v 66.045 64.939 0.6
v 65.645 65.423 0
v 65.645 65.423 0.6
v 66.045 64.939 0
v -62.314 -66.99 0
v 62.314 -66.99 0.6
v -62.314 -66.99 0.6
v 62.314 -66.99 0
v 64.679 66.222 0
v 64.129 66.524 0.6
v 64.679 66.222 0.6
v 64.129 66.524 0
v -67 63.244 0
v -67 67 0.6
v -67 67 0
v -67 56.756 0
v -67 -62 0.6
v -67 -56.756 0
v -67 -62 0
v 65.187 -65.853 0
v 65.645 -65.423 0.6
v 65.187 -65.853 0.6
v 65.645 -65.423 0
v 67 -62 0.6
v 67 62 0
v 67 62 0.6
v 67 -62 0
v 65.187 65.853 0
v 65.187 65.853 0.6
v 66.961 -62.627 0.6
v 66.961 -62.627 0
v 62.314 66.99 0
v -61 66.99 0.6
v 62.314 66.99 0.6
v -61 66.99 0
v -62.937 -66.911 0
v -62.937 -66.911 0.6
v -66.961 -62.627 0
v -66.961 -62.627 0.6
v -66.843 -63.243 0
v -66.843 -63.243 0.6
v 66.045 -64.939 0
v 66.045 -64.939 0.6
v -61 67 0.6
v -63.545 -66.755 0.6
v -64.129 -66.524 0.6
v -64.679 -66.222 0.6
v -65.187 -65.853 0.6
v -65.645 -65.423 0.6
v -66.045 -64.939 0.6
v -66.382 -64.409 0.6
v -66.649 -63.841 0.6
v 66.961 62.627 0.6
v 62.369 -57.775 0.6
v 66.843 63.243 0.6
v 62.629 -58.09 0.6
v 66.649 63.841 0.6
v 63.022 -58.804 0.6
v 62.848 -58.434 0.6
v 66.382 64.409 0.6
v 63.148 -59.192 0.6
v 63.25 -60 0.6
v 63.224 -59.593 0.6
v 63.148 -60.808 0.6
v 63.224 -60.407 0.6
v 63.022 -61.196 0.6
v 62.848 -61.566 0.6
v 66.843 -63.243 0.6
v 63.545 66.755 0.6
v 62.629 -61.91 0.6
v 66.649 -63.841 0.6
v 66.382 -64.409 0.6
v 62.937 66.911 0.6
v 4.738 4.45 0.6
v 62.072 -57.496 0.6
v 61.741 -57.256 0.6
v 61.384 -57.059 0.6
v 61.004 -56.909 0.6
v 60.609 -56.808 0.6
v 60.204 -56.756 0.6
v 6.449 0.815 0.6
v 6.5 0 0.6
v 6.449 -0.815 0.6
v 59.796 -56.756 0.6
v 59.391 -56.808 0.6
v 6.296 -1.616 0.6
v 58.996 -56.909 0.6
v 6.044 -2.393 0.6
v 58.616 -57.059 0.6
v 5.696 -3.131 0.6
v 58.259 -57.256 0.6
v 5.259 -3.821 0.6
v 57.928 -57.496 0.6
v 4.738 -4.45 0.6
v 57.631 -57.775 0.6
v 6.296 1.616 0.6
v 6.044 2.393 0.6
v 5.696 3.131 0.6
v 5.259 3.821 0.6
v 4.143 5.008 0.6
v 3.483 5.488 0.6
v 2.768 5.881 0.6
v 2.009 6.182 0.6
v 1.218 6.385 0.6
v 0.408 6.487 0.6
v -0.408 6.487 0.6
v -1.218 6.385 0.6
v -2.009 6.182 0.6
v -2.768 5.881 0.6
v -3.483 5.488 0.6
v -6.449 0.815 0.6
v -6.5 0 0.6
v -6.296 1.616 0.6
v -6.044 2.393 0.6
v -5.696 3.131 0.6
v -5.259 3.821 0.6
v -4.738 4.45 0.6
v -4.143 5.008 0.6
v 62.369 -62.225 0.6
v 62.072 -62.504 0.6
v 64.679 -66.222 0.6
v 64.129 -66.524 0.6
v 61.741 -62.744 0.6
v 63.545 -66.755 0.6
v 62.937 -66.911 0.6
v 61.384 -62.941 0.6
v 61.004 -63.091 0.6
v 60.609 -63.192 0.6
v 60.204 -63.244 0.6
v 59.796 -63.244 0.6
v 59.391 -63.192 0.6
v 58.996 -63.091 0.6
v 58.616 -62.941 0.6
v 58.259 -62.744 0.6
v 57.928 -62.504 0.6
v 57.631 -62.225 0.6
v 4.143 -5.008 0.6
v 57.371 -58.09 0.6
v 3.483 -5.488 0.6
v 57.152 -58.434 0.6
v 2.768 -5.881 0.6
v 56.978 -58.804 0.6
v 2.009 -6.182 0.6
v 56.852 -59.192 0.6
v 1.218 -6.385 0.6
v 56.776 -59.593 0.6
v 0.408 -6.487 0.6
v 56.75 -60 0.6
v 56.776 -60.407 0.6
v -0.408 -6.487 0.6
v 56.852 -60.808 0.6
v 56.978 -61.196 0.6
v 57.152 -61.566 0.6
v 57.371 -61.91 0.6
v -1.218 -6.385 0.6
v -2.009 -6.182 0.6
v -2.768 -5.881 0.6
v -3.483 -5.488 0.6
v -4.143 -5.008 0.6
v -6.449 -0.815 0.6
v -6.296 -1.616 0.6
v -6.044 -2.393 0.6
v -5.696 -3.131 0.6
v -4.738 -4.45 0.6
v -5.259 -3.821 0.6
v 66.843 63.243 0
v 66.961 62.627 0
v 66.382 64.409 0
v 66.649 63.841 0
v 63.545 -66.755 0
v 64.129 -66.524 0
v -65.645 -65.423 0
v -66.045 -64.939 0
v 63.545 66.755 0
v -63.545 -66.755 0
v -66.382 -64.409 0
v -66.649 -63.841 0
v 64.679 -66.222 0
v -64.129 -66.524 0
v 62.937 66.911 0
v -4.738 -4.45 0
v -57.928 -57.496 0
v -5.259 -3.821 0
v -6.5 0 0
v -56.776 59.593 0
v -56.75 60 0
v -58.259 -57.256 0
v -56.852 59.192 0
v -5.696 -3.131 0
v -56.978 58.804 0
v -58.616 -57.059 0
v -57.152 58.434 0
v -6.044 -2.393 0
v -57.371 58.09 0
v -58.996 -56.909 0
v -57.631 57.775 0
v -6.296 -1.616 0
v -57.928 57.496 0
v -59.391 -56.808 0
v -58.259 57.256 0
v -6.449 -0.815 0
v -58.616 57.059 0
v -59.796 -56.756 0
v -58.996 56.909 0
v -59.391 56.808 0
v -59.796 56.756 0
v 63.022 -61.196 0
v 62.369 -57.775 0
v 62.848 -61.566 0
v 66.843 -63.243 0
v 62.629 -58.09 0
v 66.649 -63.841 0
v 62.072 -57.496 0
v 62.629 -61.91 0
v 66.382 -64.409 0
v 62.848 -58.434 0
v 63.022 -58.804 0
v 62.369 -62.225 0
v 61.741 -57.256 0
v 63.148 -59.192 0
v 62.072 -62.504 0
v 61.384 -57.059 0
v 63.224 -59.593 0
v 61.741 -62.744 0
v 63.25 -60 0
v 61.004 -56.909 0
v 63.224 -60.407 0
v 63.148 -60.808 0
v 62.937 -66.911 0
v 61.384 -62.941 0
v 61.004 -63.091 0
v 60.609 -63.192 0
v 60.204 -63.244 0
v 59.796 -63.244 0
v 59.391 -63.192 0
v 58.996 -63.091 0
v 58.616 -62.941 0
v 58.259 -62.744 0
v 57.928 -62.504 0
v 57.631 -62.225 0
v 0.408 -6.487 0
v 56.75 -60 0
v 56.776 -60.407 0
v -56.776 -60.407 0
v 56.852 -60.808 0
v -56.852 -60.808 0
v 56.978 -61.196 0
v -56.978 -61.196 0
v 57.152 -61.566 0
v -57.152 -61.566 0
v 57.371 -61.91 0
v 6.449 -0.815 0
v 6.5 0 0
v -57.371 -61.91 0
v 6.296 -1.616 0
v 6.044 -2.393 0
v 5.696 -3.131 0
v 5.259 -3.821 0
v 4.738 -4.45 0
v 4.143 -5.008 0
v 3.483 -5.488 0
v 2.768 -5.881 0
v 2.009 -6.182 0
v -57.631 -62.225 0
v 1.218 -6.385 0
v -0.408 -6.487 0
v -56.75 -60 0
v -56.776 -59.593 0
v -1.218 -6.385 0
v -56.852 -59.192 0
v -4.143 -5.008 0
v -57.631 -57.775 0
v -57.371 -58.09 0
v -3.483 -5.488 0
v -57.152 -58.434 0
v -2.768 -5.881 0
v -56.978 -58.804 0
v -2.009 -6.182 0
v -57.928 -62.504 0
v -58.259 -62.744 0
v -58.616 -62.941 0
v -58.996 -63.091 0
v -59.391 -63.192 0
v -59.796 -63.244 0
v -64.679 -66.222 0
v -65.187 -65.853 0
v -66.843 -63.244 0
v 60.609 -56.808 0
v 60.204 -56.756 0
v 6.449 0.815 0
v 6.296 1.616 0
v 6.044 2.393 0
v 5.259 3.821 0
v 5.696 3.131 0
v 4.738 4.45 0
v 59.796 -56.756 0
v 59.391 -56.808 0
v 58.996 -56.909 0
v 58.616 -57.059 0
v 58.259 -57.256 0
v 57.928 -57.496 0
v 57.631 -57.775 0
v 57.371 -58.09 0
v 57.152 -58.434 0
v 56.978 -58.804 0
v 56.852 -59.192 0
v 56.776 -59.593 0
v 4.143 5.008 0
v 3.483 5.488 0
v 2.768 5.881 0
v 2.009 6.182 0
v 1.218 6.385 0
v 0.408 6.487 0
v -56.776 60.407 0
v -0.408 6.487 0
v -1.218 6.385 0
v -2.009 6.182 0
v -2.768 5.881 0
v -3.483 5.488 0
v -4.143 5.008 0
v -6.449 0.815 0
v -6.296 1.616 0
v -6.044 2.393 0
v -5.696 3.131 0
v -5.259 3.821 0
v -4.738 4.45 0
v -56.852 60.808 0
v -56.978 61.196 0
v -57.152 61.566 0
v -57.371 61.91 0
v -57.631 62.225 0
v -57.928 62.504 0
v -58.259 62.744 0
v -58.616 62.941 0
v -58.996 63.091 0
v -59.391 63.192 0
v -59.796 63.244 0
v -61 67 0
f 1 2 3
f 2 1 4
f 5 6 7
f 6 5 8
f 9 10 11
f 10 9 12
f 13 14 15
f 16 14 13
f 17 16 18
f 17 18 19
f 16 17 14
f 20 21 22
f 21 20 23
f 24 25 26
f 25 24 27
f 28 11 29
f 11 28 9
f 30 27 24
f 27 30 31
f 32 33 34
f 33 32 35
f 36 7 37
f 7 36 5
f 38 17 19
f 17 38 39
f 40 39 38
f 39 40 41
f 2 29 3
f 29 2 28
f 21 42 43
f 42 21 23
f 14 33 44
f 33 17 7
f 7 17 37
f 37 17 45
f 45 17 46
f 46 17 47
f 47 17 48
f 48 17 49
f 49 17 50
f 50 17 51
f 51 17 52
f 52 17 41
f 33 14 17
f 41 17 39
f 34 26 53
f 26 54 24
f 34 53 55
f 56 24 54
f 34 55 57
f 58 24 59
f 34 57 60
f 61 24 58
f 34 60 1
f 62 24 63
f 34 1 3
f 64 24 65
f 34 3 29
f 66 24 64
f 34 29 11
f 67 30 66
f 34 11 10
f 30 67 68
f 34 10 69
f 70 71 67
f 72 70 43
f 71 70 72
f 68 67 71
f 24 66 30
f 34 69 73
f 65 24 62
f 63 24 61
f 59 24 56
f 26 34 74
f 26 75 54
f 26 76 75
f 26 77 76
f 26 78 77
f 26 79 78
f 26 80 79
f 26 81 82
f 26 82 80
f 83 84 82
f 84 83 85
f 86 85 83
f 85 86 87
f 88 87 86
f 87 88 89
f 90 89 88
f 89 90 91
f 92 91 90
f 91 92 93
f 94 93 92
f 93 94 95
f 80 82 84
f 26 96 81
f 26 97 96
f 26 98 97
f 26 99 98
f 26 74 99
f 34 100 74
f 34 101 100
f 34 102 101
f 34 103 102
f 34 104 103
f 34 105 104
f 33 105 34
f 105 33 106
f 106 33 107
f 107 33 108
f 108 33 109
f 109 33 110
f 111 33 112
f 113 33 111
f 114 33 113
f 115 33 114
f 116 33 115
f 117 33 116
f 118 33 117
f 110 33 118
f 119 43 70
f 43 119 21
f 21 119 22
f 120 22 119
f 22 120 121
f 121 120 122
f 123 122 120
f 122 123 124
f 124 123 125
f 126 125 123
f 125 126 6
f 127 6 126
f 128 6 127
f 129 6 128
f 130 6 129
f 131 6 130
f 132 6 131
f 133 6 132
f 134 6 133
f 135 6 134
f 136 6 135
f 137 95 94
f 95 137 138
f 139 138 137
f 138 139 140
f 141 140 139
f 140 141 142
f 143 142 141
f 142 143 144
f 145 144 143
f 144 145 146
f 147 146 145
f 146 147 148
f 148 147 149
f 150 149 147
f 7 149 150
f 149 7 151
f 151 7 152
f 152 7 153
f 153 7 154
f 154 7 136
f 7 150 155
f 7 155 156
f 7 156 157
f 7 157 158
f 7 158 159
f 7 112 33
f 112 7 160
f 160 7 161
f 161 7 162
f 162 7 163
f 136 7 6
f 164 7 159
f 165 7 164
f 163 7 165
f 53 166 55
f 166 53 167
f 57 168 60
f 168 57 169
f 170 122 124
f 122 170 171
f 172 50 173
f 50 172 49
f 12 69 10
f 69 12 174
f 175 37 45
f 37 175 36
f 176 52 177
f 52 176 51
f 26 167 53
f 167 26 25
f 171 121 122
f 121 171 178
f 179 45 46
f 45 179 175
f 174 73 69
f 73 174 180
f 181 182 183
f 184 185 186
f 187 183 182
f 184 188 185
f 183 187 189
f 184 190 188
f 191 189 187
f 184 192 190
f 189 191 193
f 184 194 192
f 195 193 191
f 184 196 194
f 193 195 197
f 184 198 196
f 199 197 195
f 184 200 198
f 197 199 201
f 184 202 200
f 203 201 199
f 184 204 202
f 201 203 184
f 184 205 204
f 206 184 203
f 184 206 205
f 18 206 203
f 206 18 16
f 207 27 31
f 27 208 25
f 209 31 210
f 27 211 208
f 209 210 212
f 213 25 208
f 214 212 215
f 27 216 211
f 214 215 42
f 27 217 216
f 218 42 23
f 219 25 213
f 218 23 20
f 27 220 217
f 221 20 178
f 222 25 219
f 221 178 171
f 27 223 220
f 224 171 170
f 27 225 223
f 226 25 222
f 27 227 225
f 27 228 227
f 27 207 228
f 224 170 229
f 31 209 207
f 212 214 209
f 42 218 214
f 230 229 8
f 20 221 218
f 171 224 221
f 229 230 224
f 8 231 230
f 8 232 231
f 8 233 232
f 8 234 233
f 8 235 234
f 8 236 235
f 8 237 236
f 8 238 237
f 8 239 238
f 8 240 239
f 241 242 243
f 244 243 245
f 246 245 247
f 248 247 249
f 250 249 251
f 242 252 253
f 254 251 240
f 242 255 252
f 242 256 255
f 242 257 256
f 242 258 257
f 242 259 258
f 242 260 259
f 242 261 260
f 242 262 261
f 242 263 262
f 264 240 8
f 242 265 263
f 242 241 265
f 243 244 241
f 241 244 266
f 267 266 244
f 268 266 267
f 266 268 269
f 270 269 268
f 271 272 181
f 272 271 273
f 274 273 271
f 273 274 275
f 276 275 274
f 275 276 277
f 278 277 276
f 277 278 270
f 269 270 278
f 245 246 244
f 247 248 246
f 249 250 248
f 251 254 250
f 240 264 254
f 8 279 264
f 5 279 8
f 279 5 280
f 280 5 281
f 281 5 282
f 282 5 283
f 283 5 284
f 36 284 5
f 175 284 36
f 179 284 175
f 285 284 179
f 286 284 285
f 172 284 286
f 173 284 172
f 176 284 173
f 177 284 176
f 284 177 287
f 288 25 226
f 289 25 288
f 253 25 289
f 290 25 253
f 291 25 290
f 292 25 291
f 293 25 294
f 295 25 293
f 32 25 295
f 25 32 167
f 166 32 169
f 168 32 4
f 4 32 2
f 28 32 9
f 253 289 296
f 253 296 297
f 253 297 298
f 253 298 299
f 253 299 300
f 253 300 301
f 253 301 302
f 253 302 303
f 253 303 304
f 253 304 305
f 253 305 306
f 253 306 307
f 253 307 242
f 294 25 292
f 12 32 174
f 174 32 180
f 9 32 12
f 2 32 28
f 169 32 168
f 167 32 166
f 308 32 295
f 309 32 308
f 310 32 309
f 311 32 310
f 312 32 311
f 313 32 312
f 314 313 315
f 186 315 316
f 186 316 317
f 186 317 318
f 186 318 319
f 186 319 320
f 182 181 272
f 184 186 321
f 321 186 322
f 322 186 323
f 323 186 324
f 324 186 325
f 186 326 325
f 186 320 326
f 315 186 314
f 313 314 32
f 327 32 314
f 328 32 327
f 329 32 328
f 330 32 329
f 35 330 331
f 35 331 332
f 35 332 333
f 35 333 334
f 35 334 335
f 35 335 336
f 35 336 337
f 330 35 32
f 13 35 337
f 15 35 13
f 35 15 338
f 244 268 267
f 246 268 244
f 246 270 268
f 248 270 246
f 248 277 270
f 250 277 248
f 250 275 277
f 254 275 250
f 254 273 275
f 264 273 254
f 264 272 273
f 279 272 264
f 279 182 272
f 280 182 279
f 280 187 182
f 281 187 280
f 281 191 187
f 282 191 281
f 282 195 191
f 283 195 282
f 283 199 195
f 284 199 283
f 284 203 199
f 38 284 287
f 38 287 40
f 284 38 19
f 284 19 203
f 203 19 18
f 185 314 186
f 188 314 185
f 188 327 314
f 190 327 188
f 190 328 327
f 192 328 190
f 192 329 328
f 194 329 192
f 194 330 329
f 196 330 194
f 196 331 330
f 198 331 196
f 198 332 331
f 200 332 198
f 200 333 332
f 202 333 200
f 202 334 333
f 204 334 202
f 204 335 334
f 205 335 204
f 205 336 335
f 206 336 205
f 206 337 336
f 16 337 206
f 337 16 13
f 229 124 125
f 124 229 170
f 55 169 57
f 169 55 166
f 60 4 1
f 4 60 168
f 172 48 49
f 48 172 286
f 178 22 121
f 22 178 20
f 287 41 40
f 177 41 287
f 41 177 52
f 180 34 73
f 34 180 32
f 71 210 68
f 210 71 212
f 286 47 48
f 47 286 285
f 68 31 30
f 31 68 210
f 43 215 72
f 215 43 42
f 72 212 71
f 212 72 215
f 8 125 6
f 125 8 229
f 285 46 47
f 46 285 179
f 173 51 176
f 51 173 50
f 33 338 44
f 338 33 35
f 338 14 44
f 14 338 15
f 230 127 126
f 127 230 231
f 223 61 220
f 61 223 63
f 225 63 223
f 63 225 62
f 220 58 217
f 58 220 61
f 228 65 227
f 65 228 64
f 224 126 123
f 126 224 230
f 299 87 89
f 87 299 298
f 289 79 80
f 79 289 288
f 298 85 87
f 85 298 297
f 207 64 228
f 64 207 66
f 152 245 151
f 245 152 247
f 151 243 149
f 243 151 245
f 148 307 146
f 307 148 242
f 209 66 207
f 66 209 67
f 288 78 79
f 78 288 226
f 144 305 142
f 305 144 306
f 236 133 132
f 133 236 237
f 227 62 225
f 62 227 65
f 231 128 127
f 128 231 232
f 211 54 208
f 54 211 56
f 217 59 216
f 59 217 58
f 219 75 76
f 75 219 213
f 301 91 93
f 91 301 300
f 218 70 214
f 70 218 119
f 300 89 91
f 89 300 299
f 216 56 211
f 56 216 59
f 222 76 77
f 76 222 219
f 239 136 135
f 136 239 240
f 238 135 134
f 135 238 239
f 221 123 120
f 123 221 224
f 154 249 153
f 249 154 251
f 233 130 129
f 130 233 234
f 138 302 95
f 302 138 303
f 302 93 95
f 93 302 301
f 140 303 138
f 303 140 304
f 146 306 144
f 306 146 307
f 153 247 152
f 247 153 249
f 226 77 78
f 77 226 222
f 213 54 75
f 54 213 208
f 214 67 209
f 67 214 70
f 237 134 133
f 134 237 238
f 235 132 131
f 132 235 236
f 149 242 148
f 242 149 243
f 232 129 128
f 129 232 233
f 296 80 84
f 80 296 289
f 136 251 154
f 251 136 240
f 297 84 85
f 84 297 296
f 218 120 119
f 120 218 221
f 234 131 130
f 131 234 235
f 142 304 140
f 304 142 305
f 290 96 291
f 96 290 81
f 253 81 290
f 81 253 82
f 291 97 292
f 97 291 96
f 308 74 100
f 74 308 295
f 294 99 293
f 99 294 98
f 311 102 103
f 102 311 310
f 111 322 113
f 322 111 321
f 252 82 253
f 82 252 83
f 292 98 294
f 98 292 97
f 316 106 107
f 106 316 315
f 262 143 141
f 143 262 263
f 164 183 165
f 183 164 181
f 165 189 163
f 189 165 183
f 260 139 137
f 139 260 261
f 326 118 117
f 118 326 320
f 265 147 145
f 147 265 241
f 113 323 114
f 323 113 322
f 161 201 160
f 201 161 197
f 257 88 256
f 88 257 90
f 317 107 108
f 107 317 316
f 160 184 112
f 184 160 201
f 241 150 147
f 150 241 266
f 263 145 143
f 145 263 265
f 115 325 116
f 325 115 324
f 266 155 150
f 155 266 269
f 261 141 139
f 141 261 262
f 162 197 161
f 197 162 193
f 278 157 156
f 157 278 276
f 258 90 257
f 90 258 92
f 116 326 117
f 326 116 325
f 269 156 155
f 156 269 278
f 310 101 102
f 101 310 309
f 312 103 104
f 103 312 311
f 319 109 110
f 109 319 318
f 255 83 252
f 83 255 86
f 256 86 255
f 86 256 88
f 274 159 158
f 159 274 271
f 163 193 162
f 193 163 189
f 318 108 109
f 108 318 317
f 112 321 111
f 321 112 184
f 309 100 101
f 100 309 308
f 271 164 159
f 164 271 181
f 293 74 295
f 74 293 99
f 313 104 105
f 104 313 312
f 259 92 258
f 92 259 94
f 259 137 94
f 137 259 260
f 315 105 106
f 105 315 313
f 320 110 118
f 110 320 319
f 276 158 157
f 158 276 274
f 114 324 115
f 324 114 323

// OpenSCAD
$fn = 50;


difference() {
	union() {
		hull() {
			translate(v = [-62.0000000000, 62.0000000000, 0]) {
				cylinder(h = 0.6000000000, r = 5);
			}
			translate(v = [62.0000000000, 62.0000000000, 0]) {
				cylinder(h = 0.6000000000, r = 5);
			}
			translate(v = [-62.0000000000, -62.0000000000, 0]) {
				cylinder(h = 0.6000000000, r = 5);
			}
			translate(v = [62.0000000000, -62.0000000000, 0]) {
				cylinder(h = 0.6000000000, r = 5);
			}
		}
		translate(v = [-67.0000000000, 61.0000000000, 0]) {
			cube(size = [6, 6, 0.6000000000]);
		}
	}
	union() {
		translate(v = [-67.5000000000, -60.0000000000, -250.0000000000]) {
			rotate(a = [0, 0, 0]) {
				difference() {
					union() {
						hull() {
							translate(v = [7.5000000000, 0, 0]) {
								cylinder(h = 250, r = 3.2500000000, r1 = 3.2500000000, r2 = 3.2500000000);
							}
							translate(v = [-7.5000000000, 0, 0]) {
								cylinder(h = 250, r = 3.2500000000, r1 = 3.2500000000, r2 = 3.2500000000);
							}
						}
					}
					union();
				}
			}
		}
		translate(v = [-67.5000000000, 60.0000000000, -250.0000000000]) {
			rotate(a = [0, 0, 0]) {
				difference() {
					union() {
						hull() {
							translate(v = [7.5000000000, 0, 0]) {
								cylinder(h = 250, r = 3.2500000000, r1 = 3.2500000000, r2 = 3.2500000000);
							}
							translate(v = [-7.5000000000, 0, 0]) {
								cylinder(h = 250, r = 3.2500000000, r1 = 3.2500000000, r2 = 3.2500000000);
							}
						}
					}
					union();
				}
			}
		}
		translate(v = [60.0000000000, -60.0000000000, 0]) {
			cylinder(h = 100, r = 3.2500000000);
		}
		cylinder(h = 0.6000000000, r = 6.5000000000);
	}
}
